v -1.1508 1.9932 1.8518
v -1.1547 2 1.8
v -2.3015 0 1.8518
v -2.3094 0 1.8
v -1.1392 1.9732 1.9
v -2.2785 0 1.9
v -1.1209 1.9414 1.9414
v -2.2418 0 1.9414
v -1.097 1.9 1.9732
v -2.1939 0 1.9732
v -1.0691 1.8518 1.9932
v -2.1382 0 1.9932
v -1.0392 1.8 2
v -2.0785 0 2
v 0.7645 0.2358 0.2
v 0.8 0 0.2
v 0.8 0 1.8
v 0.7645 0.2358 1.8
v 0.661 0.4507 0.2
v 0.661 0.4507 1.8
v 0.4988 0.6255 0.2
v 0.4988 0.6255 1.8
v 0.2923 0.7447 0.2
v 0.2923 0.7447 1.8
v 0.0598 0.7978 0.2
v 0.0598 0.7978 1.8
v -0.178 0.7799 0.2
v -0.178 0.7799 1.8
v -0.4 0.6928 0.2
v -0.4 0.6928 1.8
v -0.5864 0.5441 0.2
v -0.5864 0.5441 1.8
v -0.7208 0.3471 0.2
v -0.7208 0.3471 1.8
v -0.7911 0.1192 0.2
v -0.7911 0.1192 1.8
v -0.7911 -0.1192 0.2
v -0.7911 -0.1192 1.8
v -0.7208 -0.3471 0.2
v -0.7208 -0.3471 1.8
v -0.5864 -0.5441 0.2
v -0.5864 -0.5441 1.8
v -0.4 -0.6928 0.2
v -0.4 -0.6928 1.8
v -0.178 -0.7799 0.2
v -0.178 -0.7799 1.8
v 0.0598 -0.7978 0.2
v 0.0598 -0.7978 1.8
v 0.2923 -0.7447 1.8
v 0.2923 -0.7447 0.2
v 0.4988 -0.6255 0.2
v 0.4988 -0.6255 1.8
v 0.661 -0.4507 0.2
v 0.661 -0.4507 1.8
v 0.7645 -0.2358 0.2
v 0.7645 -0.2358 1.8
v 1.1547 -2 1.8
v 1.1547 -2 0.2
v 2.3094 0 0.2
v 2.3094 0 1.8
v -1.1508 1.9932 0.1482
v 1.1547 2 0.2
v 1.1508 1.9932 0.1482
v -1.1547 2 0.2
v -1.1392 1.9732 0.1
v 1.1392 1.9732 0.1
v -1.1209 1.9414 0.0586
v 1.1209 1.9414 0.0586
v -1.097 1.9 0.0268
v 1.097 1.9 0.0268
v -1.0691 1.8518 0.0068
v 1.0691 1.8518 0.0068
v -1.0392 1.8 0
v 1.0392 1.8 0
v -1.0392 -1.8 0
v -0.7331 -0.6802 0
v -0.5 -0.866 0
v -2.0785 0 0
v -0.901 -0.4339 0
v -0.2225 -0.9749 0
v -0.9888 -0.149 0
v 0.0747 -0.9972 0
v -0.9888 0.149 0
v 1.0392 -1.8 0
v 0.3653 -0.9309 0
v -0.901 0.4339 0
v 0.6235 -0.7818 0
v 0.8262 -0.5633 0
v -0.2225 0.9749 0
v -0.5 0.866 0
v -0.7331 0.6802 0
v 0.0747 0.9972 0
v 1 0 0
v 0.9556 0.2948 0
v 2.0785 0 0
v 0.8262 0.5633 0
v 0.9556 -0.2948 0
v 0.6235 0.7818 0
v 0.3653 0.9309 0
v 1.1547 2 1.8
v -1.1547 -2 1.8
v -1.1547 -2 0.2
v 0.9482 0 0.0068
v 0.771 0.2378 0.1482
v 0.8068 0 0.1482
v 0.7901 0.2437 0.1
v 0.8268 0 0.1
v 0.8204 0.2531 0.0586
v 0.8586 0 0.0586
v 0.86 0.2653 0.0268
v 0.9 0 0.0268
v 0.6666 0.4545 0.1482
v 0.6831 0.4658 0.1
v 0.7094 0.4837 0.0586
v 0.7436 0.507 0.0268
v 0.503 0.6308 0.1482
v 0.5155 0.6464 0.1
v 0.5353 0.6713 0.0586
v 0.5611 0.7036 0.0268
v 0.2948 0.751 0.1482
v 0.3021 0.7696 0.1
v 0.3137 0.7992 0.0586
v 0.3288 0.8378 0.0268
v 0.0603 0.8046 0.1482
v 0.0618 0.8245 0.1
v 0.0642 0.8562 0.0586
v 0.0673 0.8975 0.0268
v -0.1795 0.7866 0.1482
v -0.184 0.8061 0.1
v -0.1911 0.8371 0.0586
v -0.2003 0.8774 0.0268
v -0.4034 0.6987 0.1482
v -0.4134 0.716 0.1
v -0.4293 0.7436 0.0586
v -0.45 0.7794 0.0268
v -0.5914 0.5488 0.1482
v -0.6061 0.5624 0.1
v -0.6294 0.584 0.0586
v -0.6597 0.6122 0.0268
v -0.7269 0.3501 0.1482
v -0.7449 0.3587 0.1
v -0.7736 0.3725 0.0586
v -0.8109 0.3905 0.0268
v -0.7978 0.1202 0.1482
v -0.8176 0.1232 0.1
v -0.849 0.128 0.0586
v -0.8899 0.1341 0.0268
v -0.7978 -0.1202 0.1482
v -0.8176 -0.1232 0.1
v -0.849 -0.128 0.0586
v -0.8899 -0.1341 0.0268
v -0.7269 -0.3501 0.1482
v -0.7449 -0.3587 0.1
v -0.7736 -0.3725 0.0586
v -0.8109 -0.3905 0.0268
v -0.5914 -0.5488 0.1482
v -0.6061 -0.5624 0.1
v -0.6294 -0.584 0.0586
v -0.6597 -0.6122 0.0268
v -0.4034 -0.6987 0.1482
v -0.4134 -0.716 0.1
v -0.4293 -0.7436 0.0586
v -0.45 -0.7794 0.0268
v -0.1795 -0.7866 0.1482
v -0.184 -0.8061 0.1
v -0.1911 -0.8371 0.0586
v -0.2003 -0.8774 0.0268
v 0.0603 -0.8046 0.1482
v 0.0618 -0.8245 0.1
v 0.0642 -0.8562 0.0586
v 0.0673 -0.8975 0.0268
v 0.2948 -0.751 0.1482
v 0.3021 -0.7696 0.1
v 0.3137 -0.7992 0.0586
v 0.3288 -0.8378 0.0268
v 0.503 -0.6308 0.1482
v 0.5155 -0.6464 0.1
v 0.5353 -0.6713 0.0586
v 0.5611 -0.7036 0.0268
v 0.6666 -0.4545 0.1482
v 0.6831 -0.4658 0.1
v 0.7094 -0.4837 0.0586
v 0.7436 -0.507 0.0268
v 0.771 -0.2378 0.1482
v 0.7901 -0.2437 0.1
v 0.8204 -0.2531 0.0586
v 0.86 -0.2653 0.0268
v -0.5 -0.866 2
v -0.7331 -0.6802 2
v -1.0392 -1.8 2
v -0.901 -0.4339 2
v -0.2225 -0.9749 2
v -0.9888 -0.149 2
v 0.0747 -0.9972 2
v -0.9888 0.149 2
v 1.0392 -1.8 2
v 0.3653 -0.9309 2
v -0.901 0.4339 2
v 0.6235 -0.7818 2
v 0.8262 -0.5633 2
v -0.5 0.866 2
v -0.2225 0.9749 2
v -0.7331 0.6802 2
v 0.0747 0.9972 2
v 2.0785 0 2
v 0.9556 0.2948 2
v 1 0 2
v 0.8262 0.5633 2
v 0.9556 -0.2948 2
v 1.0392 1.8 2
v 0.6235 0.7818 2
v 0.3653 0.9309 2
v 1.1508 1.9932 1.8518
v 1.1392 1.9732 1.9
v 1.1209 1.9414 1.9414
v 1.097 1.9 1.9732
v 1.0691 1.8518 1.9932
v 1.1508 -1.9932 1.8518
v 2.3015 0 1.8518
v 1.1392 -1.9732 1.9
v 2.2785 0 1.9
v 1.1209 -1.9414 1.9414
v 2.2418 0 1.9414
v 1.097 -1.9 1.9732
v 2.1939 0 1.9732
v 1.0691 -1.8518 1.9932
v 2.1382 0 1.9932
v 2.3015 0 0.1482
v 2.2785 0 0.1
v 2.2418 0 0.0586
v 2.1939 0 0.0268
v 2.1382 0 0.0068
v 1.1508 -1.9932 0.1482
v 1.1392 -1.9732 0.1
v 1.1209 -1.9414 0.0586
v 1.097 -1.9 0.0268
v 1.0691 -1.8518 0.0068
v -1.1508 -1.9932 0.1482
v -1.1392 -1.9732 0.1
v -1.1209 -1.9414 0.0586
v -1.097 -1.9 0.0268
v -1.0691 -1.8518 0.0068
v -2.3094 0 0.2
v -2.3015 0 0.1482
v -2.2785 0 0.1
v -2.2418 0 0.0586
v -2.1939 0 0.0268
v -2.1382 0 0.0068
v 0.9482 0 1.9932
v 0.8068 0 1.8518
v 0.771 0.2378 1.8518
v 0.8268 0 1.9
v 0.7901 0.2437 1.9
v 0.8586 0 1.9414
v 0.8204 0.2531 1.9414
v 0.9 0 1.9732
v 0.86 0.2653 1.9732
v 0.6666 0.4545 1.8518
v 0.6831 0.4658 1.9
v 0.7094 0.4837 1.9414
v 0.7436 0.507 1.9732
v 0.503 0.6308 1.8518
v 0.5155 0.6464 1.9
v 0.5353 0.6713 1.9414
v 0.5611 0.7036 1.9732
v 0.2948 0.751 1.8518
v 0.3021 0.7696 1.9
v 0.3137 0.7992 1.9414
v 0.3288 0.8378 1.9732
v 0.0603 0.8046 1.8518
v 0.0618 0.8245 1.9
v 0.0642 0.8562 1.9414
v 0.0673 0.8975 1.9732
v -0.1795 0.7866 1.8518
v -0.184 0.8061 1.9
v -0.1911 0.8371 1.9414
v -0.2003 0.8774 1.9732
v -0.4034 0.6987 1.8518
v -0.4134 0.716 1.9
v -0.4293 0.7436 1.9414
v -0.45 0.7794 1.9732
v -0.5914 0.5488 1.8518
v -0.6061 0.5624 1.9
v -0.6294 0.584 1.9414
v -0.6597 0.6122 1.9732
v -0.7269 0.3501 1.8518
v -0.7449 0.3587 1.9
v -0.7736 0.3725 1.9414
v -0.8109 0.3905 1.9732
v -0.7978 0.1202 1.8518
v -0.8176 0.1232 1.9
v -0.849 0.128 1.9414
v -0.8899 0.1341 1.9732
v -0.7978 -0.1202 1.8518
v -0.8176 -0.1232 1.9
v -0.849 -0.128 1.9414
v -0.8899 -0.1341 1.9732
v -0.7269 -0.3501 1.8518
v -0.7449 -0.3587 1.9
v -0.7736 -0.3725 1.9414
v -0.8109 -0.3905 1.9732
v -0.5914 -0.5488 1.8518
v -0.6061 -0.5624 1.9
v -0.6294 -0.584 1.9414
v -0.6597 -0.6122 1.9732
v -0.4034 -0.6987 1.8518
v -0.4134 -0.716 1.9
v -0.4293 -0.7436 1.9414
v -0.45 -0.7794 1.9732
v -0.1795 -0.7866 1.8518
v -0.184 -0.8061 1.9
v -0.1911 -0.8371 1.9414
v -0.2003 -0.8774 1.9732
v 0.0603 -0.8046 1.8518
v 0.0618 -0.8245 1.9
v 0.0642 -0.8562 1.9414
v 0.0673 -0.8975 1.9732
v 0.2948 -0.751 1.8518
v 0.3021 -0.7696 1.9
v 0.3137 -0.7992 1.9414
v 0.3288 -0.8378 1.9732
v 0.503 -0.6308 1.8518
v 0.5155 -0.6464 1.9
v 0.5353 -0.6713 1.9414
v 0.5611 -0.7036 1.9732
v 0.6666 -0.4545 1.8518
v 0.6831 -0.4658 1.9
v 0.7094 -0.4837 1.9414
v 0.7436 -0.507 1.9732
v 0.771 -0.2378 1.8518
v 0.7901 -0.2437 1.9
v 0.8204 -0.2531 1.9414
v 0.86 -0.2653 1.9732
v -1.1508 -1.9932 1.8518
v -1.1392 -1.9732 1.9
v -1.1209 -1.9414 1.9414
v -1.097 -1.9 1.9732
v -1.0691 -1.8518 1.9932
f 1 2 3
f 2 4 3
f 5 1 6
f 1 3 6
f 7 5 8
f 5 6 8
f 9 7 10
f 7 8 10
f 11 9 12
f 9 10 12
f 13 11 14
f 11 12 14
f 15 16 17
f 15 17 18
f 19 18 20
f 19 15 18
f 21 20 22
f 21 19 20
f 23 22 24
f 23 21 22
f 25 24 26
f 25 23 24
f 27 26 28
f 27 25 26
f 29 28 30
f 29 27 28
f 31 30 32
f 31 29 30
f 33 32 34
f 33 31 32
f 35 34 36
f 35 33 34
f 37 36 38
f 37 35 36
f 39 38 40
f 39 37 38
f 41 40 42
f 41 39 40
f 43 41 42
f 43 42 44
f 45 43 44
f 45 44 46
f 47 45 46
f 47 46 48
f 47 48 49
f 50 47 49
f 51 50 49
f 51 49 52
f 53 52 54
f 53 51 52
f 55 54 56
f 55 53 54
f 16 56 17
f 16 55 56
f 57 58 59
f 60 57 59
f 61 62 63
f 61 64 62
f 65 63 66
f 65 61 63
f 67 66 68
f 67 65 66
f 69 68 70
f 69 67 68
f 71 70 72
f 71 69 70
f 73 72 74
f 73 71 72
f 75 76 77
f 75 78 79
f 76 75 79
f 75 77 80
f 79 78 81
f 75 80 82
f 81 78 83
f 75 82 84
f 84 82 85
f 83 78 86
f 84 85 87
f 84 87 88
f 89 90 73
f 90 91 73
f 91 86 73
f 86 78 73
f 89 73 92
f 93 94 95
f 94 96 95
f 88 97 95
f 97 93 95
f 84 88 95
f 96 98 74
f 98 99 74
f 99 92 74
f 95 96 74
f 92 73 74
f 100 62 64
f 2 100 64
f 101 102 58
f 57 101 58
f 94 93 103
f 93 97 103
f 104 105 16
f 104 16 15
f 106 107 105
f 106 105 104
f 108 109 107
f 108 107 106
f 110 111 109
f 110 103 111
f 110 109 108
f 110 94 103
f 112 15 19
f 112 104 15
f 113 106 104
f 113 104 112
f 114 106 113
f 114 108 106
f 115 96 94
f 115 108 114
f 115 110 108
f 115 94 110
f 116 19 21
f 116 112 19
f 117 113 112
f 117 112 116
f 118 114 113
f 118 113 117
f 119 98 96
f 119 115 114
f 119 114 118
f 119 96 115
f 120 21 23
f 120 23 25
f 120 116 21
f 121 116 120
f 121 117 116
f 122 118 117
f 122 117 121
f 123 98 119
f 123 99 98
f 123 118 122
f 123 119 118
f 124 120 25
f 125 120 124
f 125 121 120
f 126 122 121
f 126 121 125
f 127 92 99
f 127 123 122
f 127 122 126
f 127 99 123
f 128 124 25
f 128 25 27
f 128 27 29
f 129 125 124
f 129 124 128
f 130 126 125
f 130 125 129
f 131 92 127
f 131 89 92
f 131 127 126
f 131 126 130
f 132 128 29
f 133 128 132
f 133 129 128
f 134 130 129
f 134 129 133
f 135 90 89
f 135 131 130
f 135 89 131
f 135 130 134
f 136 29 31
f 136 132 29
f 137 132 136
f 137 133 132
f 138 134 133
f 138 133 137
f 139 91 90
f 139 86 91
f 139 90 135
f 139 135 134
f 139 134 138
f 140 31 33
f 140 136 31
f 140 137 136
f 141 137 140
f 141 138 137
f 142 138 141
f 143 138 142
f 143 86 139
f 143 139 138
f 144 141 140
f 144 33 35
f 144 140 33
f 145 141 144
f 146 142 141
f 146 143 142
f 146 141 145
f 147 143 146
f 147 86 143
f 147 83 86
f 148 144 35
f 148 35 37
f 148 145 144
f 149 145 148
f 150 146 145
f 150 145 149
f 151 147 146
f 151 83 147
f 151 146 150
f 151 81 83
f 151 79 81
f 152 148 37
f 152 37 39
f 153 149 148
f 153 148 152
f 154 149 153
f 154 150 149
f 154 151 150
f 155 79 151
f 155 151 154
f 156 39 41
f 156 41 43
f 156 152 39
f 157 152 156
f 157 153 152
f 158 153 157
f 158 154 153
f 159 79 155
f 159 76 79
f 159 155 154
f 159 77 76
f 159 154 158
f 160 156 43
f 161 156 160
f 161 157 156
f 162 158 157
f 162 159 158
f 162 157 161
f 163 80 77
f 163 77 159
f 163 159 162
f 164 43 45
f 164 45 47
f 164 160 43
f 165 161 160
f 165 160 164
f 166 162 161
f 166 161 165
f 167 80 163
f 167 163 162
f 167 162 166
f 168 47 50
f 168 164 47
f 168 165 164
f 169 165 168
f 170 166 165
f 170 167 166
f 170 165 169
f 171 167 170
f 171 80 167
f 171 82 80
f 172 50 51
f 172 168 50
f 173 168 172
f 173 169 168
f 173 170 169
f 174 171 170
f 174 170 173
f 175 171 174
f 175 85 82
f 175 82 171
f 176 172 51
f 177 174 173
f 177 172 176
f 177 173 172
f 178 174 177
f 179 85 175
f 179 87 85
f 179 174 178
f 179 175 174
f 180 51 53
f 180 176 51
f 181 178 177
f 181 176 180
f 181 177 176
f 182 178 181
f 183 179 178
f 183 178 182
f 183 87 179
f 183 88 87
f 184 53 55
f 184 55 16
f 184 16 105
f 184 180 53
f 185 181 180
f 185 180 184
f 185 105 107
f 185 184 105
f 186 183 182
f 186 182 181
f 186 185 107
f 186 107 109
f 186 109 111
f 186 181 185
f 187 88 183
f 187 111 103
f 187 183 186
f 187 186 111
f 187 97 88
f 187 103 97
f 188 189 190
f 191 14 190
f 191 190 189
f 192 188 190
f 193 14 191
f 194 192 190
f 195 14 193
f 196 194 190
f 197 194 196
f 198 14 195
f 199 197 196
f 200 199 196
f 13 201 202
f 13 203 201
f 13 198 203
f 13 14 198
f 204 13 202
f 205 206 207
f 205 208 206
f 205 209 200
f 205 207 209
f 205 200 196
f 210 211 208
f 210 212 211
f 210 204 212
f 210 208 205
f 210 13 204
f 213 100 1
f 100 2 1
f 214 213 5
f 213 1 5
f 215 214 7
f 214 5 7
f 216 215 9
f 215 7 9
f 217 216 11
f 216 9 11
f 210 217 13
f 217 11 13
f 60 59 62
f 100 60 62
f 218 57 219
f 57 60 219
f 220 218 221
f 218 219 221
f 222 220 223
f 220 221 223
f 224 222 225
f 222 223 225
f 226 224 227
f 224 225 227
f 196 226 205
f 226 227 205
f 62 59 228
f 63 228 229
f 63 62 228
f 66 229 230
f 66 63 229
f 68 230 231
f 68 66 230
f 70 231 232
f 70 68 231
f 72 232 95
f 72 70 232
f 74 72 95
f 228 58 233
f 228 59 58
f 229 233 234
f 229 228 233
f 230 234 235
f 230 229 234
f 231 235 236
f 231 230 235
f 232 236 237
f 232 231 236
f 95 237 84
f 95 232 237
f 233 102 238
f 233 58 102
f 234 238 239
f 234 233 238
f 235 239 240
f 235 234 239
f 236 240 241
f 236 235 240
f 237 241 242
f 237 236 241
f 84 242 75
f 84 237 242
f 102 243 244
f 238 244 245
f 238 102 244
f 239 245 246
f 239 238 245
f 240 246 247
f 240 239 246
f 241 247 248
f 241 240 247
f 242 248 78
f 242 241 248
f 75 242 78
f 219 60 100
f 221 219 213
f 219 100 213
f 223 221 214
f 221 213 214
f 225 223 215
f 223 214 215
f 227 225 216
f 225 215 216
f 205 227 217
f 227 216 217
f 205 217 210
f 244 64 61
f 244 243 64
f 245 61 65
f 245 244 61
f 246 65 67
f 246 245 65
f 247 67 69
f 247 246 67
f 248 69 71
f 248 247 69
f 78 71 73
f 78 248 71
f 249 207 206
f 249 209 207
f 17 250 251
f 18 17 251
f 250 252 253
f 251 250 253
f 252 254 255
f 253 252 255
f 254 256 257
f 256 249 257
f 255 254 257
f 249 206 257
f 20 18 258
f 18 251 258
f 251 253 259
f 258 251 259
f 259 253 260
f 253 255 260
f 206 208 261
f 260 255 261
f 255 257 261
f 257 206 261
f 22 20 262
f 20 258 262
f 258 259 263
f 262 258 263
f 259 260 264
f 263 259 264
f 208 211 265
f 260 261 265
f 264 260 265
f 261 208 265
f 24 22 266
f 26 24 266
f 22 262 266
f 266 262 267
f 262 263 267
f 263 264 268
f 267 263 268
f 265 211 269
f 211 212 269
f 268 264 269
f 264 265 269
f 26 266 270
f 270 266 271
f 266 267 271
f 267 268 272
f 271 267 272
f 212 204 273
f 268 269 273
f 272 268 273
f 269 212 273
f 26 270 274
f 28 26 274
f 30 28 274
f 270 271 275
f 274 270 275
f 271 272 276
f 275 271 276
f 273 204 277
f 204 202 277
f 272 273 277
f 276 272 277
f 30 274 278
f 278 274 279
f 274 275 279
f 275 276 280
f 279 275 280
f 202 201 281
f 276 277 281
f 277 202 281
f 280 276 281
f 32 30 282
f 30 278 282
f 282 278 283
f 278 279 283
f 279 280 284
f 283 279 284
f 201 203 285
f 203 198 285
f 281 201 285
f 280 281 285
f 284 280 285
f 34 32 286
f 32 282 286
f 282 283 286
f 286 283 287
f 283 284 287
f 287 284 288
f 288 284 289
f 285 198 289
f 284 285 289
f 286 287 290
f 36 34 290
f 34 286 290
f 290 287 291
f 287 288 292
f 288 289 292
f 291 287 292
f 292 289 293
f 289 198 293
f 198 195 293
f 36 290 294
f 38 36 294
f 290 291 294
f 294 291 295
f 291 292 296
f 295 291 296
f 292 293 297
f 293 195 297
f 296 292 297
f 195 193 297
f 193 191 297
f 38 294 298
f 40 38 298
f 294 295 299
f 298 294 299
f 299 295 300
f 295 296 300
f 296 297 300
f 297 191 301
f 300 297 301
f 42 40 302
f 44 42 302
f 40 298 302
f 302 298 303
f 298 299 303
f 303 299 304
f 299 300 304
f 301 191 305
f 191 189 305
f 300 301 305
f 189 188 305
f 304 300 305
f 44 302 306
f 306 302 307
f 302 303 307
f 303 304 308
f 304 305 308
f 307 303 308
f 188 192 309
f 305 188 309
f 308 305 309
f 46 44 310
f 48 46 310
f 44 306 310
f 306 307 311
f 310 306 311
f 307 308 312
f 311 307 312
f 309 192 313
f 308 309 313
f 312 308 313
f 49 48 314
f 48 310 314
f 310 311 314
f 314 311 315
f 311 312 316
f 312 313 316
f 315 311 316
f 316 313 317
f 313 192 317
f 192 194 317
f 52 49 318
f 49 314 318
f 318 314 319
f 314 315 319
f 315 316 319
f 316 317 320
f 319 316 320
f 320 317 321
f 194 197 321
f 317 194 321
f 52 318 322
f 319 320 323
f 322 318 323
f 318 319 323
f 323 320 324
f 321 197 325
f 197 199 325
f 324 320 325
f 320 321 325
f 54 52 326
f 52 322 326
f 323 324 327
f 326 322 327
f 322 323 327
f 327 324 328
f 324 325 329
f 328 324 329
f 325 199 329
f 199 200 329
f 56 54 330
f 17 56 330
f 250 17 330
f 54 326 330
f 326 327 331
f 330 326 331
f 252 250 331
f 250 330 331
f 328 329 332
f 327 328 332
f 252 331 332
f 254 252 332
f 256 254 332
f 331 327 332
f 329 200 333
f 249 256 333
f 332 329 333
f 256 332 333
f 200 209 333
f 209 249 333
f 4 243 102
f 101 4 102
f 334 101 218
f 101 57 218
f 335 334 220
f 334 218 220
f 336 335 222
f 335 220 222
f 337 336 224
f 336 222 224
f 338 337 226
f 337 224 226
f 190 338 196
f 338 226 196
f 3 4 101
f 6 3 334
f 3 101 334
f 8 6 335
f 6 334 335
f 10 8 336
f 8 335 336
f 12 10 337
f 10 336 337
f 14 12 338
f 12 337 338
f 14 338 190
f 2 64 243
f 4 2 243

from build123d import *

# Parameters (mm, degrees)
SKETCH1_R           = 0.8
BOSS_EXTRUDE1_DEPTH = 2
FILLET1_R           = 0.2


with BuildPart() as part:
    # Sketch1 → Boss-Extrude1 (new body)
    with BuildSketch(Plane.XY):
        Polygon((2.309401077, 0), (1.154700538, 2), (-1.154700538, 2), (-2.309401077, 0), (-1.154700538, -2), (1.154700538, -2), align=None)
        Circle(SKETCH1_R, mode=Mode.SUBTRACT)
    extrude(amount=BOSS_EXTRUDE1_DEPTH)

    # Fillet1
    fillet1_edges = [part.edges().sort_by_distance(p)[0] for p in [
        (0, 2, 2),
        (-1.732050808, 1, 2),
        (-1.732050808, -1, 2),
        (-0.8, 0, 0),
        (-0.8, 0, 2),
        (0, -2, 2),
        (1.732050808, -1, 2),
        (0, -2, 0),
        (-1.732050808, -1, 0),
        (-1.732050808, 1, 0),
        (1.732050808, 1, 2),
        (0, 2, 0),
        (1.732050808, 1, 0),
        (1.732050808, -1, 0),
    ]]
    fillet(fillet1_edges, radius=FILLET1_R)


solid = part.part
